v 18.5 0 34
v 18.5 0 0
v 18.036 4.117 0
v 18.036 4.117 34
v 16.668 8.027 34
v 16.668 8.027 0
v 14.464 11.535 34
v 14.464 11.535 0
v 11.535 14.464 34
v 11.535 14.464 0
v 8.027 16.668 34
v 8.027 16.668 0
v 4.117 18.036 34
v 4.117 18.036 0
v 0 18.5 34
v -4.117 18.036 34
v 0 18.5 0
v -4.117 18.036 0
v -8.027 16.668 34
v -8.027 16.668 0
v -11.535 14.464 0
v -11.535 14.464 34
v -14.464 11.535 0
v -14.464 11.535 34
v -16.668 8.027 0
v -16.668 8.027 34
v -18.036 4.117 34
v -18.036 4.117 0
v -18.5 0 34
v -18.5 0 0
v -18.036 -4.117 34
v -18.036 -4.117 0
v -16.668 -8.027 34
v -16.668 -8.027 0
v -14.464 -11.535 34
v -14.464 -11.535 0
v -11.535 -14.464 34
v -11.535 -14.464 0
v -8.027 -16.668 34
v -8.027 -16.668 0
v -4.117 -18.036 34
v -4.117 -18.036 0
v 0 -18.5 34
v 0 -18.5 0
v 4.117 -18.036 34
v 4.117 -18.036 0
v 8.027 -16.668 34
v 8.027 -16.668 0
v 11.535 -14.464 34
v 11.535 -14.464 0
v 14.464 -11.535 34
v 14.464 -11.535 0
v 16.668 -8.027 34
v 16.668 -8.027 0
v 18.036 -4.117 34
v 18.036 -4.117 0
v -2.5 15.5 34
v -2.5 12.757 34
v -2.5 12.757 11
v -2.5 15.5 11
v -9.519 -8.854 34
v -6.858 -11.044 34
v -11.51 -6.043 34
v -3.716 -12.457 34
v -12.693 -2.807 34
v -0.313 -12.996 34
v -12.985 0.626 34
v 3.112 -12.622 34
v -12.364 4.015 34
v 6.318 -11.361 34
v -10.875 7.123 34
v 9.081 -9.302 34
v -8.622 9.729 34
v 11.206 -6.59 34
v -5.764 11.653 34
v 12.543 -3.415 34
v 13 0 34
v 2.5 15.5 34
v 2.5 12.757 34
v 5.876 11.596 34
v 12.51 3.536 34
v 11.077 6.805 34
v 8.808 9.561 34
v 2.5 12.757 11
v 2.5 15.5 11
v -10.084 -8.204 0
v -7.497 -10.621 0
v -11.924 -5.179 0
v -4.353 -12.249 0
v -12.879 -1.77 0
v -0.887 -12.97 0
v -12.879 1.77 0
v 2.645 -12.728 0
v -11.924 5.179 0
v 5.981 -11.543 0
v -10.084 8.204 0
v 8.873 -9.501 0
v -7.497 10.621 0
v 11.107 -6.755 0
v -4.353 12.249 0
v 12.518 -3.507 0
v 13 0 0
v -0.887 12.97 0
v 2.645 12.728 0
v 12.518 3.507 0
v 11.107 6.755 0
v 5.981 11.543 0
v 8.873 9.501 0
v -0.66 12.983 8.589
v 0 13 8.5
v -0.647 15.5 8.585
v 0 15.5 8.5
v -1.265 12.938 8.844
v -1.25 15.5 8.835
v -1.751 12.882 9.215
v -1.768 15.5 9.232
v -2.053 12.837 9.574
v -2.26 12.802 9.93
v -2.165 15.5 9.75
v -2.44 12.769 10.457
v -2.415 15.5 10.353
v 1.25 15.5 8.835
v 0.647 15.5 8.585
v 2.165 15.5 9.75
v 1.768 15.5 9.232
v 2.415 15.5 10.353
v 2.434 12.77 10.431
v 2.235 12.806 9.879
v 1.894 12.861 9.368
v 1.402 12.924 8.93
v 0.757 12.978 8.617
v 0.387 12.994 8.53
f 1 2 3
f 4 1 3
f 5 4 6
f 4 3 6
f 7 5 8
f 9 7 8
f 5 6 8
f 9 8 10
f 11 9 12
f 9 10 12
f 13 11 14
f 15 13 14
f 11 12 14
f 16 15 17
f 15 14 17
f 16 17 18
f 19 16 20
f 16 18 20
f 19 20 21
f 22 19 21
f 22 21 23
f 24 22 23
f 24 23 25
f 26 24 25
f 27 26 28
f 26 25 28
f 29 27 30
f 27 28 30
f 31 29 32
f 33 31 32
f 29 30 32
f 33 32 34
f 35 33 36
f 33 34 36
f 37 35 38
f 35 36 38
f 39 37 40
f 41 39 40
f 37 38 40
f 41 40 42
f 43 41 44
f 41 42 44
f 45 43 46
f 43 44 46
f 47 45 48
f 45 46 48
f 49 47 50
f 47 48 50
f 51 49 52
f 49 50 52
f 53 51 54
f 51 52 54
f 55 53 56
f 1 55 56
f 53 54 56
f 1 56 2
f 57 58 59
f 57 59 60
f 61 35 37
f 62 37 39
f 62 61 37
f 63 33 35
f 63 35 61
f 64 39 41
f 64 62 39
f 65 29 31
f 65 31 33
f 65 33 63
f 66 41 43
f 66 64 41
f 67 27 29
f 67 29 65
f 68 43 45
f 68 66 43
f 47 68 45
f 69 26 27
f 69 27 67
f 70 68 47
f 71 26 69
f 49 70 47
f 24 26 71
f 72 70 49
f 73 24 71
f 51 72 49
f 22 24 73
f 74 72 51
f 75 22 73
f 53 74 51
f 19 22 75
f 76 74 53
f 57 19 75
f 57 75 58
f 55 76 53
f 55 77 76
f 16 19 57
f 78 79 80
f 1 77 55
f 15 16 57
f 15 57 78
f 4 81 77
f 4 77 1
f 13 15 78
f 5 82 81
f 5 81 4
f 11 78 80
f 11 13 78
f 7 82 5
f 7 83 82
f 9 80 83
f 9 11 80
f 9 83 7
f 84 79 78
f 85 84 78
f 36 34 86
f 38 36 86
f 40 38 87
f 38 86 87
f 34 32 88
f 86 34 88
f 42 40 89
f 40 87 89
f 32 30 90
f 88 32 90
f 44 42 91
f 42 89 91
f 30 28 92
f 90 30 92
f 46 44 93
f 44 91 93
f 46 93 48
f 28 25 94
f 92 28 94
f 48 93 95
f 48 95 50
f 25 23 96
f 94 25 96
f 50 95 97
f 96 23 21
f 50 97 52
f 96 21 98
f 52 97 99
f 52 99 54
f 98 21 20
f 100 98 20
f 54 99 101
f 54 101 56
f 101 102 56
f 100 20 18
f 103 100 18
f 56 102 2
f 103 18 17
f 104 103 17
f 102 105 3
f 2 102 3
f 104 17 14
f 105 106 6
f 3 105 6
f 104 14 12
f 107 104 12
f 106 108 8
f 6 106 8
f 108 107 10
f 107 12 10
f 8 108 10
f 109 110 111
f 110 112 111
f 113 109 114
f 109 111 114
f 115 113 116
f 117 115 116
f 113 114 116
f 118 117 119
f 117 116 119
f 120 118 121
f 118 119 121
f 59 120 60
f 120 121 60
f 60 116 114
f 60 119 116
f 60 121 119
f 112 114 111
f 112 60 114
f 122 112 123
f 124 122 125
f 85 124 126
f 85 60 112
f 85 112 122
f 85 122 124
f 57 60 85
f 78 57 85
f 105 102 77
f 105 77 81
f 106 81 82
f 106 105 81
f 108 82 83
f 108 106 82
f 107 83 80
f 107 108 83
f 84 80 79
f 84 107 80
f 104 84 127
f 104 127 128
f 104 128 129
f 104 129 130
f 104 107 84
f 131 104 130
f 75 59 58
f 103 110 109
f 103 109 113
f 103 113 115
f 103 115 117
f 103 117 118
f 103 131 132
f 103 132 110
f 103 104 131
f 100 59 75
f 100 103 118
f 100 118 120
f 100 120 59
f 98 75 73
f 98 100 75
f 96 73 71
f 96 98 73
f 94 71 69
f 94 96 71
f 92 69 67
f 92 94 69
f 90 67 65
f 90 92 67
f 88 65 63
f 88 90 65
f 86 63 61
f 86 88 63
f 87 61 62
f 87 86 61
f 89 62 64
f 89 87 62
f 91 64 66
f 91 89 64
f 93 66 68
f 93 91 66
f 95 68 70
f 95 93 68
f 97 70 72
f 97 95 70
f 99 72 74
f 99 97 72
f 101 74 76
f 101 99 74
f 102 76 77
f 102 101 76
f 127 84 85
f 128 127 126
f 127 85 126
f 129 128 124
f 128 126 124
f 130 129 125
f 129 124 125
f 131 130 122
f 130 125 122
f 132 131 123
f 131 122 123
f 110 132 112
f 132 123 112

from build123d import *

# Parameters (mm, degrees)
SKETCH1_R           = 18.5
SKETCH1_R_2         = 13
BOSS_EXTRUDE1_DEPTH = 34
SKETCH2_W           = 5
SKETCH2_H           = 5
CUT_EXTRUDE1_DEPTH  = 25.5
FILLET2_R           = 2.5
FILLET3_R           = 2.5


with BuildPart() as part:
    # Sketch1 → Boss-Extrude1 (new body)
    with BuildSketch(Plane.XY):
        Circle(SKETCH1_R)
        Circle(SKETCH1_R_2, mode=Mode.SUBTRACT)
    extrude(amount=BOSS_EXTRUDE1_DEPTH)

    # Sketch2 → Cut-Extrude1 (cut)
    with BuildSketch(Plane.XY.offset(34)):
        with Locations((0, 13)):
            Rectangle(SKETCH2_W, SKETCH2_H)
    extrude(amount=-CUT_EXTRUDE1_DEPTH, mode=Mode.SUBTRACT)

    # Fillet2
    fillet2_edges = [part.edges().sort_by_distance(p)[0] for p in [
        (2.5, 14.128675411, 8.5),
    ]]
    fillet(fillet2_edges, radius=FILLET2_R)

    # Fillet3
    fillet3_edges = [part.edges().sort_by_distance(p)[0] for p in [
        (-2.5, 14.128675411, 8.5),
    ]]
    fillet(fillet3_edges, radius=FILLET3_R - 0.0001)  # a hair under: the kernel refuses the full size


solid = part.part
